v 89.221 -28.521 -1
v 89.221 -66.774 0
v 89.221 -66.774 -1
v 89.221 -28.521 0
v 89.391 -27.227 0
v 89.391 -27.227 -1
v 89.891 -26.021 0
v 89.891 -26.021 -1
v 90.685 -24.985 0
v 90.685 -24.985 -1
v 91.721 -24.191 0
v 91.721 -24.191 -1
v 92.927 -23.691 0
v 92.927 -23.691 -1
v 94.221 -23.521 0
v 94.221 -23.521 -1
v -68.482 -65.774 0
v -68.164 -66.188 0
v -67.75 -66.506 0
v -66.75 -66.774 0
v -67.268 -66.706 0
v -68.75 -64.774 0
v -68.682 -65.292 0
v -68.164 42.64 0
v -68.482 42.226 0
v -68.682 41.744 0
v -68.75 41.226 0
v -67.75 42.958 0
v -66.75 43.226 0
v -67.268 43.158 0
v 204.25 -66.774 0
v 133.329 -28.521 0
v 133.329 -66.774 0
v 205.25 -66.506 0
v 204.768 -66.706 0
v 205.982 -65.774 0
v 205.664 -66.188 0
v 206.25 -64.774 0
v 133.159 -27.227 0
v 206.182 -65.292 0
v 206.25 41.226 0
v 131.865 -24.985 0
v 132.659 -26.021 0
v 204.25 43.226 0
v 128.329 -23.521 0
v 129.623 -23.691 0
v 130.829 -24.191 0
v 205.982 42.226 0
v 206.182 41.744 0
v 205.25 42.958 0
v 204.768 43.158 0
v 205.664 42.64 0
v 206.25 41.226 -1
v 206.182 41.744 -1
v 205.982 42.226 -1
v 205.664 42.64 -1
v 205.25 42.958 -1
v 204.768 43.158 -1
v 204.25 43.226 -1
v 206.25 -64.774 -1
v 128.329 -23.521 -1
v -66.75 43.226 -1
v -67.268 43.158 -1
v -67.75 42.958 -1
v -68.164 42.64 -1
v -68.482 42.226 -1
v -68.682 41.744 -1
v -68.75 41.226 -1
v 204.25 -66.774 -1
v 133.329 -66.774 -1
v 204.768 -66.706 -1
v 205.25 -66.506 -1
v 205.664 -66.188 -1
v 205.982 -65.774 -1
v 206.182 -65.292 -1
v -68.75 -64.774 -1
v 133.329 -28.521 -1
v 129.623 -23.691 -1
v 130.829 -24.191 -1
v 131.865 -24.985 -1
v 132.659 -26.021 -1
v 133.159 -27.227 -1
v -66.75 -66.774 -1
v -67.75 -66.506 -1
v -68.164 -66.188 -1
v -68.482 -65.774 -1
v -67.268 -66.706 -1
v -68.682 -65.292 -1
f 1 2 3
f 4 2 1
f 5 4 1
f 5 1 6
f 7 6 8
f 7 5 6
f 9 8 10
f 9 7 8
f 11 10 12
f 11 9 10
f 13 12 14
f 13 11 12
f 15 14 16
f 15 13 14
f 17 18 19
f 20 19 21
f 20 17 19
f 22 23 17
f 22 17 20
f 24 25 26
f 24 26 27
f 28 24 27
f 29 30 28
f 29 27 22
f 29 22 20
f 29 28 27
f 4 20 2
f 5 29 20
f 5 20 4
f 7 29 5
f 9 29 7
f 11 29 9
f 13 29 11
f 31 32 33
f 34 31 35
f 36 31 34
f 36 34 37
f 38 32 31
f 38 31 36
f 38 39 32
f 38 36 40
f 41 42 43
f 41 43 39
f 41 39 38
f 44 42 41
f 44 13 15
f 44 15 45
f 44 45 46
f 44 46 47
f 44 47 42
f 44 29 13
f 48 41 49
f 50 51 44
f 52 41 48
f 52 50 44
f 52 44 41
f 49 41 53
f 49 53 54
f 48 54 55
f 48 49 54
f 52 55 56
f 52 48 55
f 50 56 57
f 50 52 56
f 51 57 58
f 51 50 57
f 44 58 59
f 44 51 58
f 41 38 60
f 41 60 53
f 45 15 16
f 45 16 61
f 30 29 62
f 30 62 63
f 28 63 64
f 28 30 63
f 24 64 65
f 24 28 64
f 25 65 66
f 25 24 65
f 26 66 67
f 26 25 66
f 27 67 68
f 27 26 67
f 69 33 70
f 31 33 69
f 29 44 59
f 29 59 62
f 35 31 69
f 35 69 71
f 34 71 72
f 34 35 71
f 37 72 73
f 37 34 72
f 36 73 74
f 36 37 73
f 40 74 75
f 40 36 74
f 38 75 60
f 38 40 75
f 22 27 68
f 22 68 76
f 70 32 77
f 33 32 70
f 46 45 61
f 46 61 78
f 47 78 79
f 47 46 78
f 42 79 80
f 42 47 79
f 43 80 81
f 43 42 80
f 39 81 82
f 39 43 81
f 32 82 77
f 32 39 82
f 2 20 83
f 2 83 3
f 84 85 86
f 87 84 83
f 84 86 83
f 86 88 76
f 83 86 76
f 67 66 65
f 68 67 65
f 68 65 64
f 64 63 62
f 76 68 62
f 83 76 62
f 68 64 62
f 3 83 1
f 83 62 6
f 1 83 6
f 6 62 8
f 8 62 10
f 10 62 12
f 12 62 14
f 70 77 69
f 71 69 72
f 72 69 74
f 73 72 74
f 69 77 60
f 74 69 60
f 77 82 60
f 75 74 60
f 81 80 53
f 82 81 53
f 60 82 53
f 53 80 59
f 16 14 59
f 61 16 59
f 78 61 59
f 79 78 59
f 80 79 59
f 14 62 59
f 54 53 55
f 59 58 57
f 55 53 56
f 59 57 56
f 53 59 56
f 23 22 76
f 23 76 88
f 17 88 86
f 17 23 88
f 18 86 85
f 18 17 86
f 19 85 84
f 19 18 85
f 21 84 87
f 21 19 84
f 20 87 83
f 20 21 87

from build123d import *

# Parameters (mm, degrees)
SM_BASE_FLANGE_1_DEPTH = 1


# Sheet-metal steps are written as plain solids
with BuildPart() as part:
    # Sketch 1 → Базовая кромка1 (new body)
    with BuildSketch(Plane.XY):
        with BuildLine():
            Line((89.221000297, -66.773952096), (89.221000297, -28.520742394))
            ThreePointArc((89.221000297, -28.520742394), (90.685466391, -24.985208488), (94.221000297, -23.520742394))
            Line((94.221000297, -23.520742394), (128.329321471, -23.520742394))
            ThreePointArc((128.329321471, -23.520742394), (131.864855377, -24.985208488), (133.329321471, -28.520742394))
            Line((133.329321471, -28.520742394), (133.329321471, -66.773952096))
            Line((133.329321471, -66.773952096), (204.25, -66.773952096))
            ThreePointArc((204.25, -66.773952096), (205.664213562, -66.188165658), (206.25, -64.773952096))
            Line((206.25, -64.773952096), (206.25, 41.226047904))
            ThreePointArc((206.25, 41.226047904), (205.664213562, 42.640261467), (204.25, 43.226047904))
            Line((204.25, 43.226047904), (-66.75, 43.226047904))
            ThreePointArc((-66.75, 43.226047904), (-68.164213562, 42.640261467), (-68.75, 41.226047904))
            Line((-68.75, 41.226047904), (-68.75, -64.773952096))
            ThreePointArc((-68.75, -64.773952096), (-68.164213562, -66.188165658), (-66.75, -66.773952096))
            Line((-66.75, -66.773952096), (89.221000297, -66.773952096))
        make_face()
    extrude(amount=-SM_BASE_FLANGE_1_DEPTH)


solid = part.part
